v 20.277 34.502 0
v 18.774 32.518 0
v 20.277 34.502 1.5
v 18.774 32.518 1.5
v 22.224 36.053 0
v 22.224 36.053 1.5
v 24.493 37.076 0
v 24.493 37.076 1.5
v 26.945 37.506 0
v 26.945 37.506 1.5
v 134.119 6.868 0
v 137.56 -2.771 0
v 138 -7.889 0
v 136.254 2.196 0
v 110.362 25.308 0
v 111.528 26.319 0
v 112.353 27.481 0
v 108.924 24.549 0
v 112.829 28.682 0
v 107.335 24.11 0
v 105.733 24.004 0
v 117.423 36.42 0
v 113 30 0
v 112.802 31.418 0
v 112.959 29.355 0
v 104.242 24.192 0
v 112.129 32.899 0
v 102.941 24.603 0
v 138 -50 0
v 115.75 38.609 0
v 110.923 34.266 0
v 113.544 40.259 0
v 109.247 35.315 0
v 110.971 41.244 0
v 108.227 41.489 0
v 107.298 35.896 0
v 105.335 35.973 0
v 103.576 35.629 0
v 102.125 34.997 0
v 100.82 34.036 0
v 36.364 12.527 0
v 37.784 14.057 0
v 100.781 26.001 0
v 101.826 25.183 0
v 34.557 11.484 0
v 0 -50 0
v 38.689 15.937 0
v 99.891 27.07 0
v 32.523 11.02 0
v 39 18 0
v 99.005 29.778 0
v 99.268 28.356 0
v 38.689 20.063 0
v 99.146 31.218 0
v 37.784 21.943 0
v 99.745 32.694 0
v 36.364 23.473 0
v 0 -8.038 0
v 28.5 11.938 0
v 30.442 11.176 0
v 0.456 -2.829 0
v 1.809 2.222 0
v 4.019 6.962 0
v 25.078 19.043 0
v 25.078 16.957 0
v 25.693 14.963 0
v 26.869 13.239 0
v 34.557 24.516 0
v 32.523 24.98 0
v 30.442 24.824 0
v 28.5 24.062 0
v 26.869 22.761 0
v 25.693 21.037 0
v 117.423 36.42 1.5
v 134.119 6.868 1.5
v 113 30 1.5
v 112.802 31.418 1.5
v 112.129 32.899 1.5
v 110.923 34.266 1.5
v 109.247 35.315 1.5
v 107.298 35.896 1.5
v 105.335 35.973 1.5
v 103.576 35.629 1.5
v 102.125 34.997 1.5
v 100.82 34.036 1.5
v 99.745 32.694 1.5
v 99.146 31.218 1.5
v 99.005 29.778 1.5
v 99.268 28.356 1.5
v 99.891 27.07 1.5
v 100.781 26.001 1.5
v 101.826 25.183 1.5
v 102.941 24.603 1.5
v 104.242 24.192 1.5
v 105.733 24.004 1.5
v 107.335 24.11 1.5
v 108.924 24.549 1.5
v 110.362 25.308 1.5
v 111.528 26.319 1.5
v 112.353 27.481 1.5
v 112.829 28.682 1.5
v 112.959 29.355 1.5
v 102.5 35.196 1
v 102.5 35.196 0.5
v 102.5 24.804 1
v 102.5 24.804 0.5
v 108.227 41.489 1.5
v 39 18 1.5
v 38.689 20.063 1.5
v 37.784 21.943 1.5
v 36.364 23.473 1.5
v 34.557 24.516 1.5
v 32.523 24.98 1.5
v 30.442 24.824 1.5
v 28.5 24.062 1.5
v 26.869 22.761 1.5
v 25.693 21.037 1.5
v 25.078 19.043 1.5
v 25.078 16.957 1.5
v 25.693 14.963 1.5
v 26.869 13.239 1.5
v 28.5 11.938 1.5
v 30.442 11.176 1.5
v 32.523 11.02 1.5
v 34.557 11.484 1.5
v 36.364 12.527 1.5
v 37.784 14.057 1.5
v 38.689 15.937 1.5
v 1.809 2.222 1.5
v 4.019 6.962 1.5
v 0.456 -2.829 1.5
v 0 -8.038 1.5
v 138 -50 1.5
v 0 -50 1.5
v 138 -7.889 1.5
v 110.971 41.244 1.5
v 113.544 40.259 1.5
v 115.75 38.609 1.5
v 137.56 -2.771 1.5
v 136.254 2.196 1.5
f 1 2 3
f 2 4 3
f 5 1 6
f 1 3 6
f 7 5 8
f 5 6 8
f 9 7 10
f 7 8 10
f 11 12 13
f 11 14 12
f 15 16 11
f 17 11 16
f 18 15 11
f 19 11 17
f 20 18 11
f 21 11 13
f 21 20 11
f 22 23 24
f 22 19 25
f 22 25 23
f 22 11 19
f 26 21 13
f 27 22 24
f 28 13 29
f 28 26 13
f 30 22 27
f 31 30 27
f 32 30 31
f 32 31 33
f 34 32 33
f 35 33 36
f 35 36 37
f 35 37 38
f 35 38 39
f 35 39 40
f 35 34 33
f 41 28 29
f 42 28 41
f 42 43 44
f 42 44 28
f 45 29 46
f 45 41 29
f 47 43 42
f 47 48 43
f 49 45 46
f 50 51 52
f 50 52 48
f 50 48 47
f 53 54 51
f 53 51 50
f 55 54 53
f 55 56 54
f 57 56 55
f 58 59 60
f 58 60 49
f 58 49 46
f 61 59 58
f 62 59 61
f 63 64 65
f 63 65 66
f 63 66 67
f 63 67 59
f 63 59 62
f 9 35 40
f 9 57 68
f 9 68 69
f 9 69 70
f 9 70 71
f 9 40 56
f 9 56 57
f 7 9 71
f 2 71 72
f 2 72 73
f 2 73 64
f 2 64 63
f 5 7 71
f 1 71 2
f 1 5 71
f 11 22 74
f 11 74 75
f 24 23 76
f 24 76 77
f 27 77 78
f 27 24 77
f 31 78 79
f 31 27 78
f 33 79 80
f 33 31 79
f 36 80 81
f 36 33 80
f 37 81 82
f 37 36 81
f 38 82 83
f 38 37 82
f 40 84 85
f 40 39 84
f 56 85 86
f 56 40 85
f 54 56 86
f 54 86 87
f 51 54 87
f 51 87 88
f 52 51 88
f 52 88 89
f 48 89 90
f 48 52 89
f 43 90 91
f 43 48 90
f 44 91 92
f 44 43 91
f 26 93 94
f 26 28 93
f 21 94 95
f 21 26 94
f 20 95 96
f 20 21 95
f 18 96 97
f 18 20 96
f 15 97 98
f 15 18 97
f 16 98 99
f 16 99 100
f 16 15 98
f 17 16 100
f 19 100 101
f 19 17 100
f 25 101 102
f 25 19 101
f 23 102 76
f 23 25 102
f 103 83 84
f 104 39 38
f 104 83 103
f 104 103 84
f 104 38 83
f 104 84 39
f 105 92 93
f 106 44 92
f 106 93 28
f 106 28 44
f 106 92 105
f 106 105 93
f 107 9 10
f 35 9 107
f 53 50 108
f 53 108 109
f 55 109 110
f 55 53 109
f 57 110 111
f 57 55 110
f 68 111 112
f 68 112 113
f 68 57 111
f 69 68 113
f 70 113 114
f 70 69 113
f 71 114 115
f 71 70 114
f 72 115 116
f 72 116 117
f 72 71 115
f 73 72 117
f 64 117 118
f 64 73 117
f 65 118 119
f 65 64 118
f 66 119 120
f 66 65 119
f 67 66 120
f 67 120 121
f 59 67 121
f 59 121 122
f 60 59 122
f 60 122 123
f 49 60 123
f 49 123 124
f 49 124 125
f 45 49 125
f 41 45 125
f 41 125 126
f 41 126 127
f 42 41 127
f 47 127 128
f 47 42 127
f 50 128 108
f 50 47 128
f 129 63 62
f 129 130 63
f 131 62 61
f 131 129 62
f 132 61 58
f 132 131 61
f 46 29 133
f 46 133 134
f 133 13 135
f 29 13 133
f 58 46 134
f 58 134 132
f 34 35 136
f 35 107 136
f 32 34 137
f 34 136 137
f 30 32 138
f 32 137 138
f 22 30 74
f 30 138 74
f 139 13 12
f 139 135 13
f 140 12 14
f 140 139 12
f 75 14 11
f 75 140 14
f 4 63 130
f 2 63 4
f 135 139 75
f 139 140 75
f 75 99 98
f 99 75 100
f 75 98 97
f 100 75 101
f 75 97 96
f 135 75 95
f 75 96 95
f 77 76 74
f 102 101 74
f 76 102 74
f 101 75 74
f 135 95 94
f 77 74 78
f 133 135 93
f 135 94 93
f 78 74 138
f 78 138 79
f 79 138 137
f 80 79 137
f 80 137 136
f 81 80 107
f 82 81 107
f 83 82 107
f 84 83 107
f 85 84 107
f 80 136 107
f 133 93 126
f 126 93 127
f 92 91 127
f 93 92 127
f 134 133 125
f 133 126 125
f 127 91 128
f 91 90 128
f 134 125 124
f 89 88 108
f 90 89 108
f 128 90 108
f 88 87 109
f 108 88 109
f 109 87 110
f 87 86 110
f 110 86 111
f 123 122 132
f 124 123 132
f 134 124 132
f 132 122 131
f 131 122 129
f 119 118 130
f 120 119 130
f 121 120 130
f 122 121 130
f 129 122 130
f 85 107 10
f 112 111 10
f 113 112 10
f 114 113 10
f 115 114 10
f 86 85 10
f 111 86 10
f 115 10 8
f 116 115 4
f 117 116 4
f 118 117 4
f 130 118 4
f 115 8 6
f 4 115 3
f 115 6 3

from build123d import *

# Parameters (mm, degrees)
SKETCH_R    = 7
PAD_DEPTH   = 1.5
FILLET_R    = 10
FILLET001_R = 30


with BuildPart() as part:
    # Sketch → Pad (new body)
    with BuildSketch(Plane.XY):
        Polygon((0, -50), (0, 0), (21.5, 37.239092), (114.38853, 41.791129), (138, 0), (138, -50), align=None)
        with Locations((32, 18)):
            Circle(SKETCH_R, mode=Mode.SUBTRACT)
        with BuildLine():
            add(Edge.make_bspline(
                [(113, 30), (113, 40.392305), (102.5, 35.196152), (92, 30), (102.5, 24.803848), (113, 19.607695), (113, 30)],
                knots=[0, 0, 0, 2.094395, 2.094395, 4.18879, 4.18879, 6.283185, 6.283185, 6.283185], degree=2, weights=[1, 0.5, 1, 0.5, 1, 0.5, 1]))
        make_face(mode=Mode.SUBTRACT)
    extrude(amount=PAD_DEPTH)

    # Fillet
    fillet_edges = [part.edges().sort_by_distance(p)[0] for p in [
        (21.5, 37.239092, 0.75),
        (114.38853, 41.791129, 0.75),
    ]]
    fillet(fillet_edges, radius=FILLET_R)

    # Fillet001
    fillet001_edges = [part.edges().sort_by_distance(p)[0] for p in [
        (138, 0, 0.75),
        (0, 0, 0.75),
    ]]
    fillet(fillet001_edges, radius=FILLET001_R)


solid = part.part
